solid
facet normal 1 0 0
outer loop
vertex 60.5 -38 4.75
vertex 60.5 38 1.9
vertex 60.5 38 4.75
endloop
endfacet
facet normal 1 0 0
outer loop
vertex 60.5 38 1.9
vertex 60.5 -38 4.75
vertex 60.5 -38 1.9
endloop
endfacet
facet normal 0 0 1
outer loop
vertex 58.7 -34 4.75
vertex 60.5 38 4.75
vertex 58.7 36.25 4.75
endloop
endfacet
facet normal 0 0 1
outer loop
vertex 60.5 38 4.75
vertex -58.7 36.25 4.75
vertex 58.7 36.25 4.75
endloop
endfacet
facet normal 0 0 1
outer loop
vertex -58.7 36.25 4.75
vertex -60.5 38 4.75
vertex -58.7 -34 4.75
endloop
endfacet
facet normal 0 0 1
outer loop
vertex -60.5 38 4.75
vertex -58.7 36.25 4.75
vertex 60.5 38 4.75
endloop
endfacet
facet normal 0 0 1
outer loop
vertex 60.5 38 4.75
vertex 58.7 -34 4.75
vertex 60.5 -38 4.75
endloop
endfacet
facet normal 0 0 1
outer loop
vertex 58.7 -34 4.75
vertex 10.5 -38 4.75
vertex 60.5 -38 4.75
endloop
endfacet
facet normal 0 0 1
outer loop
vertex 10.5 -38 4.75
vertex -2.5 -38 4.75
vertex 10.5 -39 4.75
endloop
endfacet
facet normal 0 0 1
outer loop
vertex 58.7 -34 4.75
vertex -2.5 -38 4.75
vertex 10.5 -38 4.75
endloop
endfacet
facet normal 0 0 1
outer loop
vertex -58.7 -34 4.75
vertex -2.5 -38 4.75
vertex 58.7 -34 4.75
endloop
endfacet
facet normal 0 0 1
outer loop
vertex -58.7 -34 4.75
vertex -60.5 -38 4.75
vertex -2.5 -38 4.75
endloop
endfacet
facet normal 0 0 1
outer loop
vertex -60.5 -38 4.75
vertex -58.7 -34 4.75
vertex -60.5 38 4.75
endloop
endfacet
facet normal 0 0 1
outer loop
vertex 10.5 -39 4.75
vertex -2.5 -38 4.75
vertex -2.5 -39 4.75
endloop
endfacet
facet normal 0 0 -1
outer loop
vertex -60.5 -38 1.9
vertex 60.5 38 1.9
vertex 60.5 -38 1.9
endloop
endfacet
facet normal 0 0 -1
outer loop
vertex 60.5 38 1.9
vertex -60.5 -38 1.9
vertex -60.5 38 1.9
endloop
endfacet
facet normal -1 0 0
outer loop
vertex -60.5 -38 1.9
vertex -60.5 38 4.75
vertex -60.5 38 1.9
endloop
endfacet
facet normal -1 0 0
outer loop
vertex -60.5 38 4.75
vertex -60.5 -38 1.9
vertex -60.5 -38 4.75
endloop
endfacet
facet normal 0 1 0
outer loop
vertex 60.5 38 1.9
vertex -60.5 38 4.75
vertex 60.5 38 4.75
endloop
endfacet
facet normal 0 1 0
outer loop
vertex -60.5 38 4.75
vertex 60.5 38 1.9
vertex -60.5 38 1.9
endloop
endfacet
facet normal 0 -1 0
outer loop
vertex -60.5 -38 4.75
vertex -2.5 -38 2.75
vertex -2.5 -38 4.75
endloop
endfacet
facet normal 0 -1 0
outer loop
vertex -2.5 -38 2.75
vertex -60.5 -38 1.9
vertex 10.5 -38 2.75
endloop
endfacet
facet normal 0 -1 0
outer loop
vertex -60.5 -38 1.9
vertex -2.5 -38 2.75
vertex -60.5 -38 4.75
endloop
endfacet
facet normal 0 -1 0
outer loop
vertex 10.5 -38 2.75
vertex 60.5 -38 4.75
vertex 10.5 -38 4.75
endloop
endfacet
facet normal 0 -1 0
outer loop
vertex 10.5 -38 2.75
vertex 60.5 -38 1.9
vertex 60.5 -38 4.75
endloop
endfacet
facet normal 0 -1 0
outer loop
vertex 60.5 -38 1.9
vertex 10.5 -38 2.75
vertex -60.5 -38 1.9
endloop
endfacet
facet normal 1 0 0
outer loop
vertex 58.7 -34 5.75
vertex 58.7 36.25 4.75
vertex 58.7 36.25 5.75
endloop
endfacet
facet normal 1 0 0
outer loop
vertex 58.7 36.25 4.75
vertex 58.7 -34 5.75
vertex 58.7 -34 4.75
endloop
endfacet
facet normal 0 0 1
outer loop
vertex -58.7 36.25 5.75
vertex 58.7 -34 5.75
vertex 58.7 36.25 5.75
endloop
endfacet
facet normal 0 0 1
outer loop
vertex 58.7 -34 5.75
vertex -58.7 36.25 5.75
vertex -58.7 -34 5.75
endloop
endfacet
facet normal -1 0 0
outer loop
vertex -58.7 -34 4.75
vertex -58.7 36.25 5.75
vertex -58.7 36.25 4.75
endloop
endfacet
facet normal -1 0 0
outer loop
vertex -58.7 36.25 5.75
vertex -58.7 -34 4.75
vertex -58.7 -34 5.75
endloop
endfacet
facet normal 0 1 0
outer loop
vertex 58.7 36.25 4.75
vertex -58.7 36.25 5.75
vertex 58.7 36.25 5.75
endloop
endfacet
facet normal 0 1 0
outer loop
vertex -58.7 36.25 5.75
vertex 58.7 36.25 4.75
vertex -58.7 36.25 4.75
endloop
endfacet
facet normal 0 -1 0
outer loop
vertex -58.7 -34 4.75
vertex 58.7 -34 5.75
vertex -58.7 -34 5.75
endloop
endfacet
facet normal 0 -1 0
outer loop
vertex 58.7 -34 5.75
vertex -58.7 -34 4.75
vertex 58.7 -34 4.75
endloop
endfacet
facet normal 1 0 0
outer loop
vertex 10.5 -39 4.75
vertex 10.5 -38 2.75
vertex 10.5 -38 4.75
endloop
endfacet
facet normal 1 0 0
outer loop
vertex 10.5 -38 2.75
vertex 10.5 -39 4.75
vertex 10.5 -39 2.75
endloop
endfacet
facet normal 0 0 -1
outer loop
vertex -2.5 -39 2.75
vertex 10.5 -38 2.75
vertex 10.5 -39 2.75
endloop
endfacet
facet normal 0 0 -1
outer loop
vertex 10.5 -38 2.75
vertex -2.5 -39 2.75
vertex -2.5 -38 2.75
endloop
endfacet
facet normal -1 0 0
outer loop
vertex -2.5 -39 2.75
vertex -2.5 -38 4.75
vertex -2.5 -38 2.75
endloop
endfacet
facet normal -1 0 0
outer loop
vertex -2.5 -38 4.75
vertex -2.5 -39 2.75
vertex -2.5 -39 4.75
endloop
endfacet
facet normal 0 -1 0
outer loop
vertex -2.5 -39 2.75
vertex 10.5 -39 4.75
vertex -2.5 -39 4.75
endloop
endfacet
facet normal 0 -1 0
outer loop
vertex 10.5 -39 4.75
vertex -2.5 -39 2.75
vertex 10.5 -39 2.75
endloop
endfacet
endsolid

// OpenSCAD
$fn=64;

// HDMI display 5"
// Overall: 121 x 76 x 2.85
// PCB offset: [0,0,1.9]
// Aperture: [[-54, -30.225], [54, 34.575, 0.5]]
// Touch screen: [[-58.7, -34], [58.7, 36.25, 1]]
// Thread length: 2
// Clearance for TS ribbon: [[-2.5, -39], [10.5, -33]]

module hdmi_display_5in(
    size = [121, 76, 2.85],
    pcb_offset = [0,0,1.9],
    aperture = [[-54, -30.225], [54, 34.575, 0.5]],
    touch = [[-58.7, -34], [58.7, 36.25, 1]],
    ribbon_clear = [[-2.5, -39], [10.5, -33]],
    thread_len = 2
){
    // Base PCB
    color([0.05,0.35,0.12])
    translate([-size[0]/2, -size[1]/2, pcb_offset[2]])
        cube(size, center=false);

    // Touchscreen glass (slightly above PCB)
    touch_z = pcb_offset[2] + size[2];
    touch_th = touch[1][2];
    touch_min = [touch[0][0], touch[0][1]];
    touch_max = [touch[1][0], touch[1][1]];
    touch_size = [touch_max[0]-touch_min[0], touch_max[1]-touch_min[1], touch_th];

    color([0.75,0.85,0.95,0.35])
    translate([touch_min[0], touch_min[1], touch_z])
        cube(touch_size, center=false);

    // Display aperture (cutout volume shown as dark region on top of glass)
    ap_min = [aperture[0][0], aperture[0][1]];
    ap_max = [aperture[1][0], aperture[1][1]];
    ap_th  = aperture[1][2];
    ap_size = [ap_max[0]-ap_min[0], ap_max[1]-ap_min[1], ap_th];

    color([0.02,0.02,0.02,0.9])
    translate([ap_min[0], ap_min[1], touch_z + (touch_th - ap_th)])
        cube(ap_size, center=false);

    // Ribbon clearance volume (shown as translucent red below/around glass edge)
    rc_min = [ribbon_clear[0][0], ribbon_clear[0][1]];
    rc_max = [ribbon_clear[1][0], ribbon_clear[1][1]];
    rc_size = [rc_max[0]-rc_min[0], rc_max[1]-rc_min[1], thread_len];

    color([1,0,0,0.25])
    translate([rc_min[0], rc_min[1], pcb_offset[2] + size[2] - thread_len])
        cube(rc_size, center=false);
}

hdmi_display_5in();
